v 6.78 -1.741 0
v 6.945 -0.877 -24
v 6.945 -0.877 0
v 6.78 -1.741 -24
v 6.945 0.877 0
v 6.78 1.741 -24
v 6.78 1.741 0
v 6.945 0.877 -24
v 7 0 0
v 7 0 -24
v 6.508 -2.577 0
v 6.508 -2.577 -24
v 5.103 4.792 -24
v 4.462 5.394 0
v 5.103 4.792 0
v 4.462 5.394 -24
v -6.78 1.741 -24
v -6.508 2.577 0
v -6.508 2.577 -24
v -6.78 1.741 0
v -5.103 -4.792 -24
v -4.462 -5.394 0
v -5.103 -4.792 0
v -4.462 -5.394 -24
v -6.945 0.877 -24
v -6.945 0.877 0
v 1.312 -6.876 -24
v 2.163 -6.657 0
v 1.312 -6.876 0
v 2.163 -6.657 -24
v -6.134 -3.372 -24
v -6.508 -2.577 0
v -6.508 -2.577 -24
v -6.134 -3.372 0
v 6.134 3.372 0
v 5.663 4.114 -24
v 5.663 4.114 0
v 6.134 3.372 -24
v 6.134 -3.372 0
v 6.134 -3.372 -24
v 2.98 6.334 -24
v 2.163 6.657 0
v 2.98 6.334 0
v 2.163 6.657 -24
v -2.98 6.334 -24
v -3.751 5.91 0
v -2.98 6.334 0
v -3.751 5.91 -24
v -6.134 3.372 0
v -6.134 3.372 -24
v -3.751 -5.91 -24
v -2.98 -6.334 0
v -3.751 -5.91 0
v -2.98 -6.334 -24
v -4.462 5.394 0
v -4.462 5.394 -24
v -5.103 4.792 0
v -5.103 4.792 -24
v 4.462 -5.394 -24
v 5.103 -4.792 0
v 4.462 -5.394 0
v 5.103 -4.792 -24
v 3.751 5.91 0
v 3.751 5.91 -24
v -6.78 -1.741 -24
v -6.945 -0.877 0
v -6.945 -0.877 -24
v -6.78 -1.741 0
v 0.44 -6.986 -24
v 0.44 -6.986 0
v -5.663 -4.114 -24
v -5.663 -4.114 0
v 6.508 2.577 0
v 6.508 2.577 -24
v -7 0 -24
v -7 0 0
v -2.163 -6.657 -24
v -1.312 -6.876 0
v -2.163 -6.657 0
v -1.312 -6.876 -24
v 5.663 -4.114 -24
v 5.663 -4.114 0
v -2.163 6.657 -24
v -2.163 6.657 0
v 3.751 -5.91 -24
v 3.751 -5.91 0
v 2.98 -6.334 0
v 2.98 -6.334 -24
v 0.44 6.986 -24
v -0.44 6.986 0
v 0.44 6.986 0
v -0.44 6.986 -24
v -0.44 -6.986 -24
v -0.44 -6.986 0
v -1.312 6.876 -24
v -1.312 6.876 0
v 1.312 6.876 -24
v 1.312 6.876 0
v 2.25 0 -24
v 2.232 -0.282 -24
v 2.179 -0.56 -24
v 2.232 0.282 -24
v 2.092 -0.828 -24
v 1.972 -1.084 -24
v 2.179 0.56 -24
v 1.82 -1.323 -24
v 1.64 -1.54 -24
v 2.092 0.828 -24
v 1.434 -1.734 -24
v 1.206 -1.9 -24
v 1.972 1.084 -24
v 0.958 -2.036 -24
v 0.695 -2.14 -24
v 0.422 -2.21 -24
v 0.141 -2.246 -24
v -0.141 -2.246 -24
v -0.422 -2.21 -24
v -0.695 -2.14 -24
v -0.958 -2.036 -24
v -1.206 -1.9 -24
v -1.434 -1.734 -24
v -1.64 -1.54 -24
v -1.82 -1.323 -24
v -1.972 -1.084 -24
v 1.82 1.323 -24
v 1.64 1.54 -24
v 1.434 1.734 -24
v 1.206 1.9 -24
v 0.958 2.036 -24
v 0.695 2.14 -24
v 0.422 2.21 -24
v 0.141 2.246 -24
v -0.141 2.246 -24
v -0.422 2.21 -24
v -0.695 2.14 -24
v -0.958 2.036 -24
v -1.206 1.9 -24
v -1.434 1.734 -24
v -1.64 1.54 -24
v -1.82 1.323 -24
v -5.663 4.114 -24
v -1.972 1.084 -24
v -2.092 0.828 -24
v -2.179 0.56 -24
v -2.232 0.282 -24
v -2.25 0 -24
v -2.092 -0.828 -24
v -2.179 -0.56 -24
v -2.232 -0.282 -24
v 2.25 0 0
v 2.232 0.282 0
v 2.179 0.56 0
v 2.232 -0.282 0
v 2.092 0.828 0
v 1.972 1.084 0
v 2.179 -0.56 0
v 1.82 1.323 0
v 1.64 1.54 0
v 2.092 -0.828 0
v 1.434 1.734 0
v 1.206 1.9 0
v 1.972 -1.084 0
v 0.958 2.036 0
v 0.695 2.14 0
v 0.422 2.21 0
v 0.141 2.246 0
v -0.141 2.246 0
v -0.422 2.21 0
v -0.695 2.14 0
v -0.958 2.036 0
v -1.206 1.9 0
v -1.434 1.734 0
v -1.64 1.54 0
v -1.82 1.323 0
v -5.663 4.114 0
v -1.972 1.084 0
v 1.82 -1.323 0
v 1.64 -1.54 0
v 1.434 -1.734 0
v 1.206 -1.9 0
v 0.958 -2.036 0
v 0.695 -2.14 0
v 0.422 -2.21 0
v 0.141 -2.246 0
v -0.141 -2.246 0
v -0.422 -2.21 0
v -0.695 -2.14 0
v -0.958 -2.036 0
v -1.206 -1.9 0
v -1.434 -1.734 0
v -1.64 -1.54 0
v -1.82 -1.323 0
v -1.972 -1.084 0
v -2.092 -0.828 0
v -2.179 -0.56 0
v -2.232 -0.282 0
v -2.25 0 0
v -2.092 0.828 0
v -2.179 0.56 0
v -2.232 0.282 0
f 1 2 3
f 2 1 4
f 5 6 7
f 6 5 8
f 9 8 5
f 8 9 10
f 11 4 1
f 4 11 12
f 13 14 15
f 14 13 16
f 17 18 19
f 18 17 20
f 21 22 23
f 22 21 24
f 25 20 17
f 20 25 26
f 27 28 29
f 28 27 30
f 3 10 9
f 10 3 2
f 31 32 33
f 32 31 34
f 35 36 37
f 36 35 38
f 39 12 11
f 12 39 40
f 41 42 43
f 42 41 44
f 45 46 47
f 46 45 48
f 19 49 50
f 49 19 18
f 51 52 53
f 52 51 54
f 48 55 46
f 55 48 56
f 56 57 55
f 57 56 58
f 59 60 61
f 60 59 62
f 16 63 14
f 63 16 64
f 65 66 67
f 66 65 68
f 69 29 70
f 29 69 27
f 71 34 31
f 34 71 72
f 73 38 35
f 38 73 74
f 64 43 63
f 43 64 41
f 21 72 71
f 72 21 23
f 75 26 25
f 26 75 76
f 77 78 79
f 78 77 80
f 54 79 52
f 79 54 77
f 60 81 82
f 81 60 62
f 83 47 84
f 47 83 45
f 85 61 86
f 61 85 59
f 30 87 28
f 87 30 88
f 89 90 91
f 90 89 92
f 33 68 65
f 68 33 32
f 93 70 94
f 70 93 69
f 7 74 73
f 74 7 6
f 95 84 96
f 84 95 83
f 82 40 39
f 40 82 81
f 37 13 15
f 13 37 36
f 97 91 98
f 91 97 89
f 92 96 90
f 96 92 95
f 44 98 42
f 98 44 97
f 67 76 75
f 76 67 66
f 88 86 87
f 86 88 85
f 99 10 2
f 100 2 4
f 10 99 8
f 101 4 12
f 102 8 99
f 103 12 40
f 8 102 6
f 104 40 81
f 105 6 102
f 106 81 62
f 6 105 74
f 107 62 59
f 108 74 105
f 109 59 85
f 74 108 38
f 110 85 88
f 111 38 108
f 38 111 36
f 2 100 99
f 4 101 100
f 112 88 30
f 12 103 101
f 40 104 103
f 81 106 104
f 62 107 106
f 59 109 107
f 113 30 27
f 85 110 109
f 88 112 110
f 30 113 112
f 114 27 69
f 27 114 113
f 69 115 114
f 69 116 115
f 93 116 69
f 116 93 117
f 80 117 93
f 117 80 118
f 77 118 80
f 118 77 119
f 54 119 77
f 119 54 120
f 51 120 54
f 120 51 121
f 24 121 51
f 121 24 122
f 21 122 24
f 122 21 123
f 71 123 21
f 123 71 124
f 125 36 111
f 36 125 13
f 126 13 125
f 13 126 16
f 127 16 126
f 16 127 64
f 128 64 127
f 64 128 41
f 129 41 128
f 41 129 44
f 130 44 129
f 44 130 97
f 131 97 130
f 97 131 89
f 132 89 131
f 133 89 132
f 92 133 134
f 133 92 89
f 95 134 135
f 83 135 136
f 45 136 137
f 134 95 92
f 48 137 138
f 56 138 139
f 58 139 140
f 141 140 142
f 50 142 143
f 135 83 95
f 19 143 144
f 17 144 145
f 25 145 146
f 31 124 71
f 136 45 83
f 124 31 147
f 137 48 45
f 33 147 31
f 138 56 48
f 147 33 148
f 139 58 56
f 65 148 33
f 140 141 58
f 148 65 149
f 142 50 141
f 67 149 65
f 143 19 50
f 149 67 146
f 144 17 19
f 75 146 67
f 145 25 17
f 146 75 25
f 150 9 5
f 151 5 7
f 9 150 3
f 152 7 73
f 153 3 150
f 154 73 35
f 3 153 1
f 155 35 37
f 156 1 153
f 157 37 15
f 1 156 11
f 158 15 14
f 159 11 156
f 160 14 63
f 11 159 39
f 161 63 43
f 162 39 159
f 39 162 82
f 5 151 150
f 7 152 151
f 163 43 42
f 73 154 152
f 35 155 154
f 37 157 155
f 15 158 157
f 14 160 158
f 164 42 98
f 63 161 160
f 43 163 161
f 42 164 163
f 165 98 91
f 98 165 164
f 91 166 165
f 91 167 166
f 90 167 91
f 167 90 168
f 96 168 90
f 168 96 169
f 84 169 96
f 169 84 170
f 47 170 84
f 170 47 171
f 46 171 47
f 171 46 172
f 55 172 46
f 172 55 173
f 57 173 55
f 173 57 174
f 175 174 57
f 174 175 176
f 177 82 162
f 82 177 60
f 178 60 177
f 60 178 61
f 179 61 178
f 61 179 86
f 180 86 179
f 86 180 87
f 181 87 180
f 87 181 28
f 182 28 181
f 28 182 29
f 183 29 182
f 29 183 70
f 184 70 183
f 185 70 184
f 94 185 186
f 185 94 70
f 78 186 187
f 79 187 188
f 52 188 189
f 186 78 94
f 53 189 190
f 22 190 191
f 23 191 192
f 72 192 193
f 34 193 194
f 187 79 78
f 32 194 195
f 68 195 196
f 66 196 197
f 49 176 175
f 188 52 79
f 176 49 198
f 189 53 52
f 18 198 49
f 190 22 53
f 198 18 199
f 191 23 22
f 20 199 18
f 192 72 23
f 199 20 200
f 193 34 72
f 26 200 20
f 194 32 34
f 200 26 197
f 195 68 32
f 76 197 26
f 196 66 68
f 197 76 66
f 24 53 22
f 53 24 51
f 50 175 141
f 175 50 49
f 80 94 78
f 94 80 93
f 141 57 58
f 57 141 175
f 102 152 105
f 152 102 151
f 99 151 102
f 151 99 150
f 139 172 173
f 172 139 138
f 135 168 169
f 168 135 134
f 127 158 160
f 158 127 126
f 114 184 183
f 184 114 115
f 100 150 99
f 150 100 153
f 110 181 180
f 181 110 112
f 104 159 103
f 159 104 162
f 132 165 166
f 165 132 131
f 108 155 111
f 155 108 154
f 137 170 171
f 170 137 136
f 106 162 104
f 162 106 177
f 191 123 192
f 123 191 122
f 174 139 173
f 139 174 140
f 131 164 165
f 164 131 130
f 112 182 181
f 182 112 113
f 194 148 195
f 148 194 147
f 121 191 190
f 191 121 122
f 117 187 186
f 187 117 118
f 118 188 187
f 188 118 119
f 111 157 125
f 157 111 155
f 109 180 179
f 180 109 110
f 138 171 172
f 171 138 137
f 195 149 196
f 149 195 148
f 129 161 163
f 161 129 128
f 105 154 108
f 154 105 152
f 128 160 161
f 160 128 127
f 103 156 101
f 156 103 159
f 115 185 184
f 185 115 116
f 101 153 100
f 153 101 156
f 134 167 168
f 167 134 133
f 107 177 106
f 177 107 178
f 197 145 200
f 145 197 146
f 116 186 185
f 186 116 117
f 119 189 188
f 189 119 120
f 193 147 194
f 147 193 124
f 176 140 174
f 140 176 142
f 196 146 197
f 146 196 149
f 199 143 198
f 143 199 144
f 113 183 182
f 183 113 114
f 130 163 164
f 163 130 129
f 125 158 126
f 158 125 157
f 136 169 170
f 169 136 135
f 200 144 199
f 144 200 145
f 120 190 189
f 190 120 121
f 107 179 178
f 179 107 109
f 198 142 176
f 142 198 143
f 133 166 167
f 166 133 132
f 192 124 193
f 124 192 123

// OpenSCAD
$fn = 50;


difference() {
	union() {
		translate(v = [0, 0, -24.0000000000]) {
			cylinder(h = 24, r = 7.0000000000);
		}
	}
	union() {
		#translate(v = [0, 0, -24]) {
			cylinder(h = 24, r = 2.2500000000);
		}
	}
}
